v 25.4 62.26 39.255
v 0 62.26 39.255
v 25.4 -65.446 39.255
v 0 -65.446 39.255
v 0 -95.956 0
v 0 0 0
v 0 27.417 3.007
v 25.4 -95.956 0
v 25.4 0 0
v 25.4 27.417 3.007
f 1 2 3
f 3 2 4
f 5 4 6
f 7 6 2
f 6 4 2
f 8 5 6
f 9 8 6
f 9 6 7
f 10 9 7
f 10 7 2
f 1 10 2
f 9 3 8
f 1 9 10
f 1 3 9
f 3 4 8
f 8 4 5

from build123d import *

# Parameters (mm, degrees)
F3_DEPTH = 25.4


# Not quite as in the source:
# - the program builds the solid bodies; features that only make, move or delete a surface that nothing else refers to are left out


with BuildPart() as f3:
    # F2 (on Right) → F3 (new body)
    with BuildSketch(Plane.YZ):
        Polygon((62.2603967786, 39.2553694546), (-65.4462724924, 39.2553694546), (-95.9557369351, 0), (0, 0), (27.4173058569, 3.0065653846), align=None)
    extrude(amount=F3_DEPTH)


solid = f3.part
